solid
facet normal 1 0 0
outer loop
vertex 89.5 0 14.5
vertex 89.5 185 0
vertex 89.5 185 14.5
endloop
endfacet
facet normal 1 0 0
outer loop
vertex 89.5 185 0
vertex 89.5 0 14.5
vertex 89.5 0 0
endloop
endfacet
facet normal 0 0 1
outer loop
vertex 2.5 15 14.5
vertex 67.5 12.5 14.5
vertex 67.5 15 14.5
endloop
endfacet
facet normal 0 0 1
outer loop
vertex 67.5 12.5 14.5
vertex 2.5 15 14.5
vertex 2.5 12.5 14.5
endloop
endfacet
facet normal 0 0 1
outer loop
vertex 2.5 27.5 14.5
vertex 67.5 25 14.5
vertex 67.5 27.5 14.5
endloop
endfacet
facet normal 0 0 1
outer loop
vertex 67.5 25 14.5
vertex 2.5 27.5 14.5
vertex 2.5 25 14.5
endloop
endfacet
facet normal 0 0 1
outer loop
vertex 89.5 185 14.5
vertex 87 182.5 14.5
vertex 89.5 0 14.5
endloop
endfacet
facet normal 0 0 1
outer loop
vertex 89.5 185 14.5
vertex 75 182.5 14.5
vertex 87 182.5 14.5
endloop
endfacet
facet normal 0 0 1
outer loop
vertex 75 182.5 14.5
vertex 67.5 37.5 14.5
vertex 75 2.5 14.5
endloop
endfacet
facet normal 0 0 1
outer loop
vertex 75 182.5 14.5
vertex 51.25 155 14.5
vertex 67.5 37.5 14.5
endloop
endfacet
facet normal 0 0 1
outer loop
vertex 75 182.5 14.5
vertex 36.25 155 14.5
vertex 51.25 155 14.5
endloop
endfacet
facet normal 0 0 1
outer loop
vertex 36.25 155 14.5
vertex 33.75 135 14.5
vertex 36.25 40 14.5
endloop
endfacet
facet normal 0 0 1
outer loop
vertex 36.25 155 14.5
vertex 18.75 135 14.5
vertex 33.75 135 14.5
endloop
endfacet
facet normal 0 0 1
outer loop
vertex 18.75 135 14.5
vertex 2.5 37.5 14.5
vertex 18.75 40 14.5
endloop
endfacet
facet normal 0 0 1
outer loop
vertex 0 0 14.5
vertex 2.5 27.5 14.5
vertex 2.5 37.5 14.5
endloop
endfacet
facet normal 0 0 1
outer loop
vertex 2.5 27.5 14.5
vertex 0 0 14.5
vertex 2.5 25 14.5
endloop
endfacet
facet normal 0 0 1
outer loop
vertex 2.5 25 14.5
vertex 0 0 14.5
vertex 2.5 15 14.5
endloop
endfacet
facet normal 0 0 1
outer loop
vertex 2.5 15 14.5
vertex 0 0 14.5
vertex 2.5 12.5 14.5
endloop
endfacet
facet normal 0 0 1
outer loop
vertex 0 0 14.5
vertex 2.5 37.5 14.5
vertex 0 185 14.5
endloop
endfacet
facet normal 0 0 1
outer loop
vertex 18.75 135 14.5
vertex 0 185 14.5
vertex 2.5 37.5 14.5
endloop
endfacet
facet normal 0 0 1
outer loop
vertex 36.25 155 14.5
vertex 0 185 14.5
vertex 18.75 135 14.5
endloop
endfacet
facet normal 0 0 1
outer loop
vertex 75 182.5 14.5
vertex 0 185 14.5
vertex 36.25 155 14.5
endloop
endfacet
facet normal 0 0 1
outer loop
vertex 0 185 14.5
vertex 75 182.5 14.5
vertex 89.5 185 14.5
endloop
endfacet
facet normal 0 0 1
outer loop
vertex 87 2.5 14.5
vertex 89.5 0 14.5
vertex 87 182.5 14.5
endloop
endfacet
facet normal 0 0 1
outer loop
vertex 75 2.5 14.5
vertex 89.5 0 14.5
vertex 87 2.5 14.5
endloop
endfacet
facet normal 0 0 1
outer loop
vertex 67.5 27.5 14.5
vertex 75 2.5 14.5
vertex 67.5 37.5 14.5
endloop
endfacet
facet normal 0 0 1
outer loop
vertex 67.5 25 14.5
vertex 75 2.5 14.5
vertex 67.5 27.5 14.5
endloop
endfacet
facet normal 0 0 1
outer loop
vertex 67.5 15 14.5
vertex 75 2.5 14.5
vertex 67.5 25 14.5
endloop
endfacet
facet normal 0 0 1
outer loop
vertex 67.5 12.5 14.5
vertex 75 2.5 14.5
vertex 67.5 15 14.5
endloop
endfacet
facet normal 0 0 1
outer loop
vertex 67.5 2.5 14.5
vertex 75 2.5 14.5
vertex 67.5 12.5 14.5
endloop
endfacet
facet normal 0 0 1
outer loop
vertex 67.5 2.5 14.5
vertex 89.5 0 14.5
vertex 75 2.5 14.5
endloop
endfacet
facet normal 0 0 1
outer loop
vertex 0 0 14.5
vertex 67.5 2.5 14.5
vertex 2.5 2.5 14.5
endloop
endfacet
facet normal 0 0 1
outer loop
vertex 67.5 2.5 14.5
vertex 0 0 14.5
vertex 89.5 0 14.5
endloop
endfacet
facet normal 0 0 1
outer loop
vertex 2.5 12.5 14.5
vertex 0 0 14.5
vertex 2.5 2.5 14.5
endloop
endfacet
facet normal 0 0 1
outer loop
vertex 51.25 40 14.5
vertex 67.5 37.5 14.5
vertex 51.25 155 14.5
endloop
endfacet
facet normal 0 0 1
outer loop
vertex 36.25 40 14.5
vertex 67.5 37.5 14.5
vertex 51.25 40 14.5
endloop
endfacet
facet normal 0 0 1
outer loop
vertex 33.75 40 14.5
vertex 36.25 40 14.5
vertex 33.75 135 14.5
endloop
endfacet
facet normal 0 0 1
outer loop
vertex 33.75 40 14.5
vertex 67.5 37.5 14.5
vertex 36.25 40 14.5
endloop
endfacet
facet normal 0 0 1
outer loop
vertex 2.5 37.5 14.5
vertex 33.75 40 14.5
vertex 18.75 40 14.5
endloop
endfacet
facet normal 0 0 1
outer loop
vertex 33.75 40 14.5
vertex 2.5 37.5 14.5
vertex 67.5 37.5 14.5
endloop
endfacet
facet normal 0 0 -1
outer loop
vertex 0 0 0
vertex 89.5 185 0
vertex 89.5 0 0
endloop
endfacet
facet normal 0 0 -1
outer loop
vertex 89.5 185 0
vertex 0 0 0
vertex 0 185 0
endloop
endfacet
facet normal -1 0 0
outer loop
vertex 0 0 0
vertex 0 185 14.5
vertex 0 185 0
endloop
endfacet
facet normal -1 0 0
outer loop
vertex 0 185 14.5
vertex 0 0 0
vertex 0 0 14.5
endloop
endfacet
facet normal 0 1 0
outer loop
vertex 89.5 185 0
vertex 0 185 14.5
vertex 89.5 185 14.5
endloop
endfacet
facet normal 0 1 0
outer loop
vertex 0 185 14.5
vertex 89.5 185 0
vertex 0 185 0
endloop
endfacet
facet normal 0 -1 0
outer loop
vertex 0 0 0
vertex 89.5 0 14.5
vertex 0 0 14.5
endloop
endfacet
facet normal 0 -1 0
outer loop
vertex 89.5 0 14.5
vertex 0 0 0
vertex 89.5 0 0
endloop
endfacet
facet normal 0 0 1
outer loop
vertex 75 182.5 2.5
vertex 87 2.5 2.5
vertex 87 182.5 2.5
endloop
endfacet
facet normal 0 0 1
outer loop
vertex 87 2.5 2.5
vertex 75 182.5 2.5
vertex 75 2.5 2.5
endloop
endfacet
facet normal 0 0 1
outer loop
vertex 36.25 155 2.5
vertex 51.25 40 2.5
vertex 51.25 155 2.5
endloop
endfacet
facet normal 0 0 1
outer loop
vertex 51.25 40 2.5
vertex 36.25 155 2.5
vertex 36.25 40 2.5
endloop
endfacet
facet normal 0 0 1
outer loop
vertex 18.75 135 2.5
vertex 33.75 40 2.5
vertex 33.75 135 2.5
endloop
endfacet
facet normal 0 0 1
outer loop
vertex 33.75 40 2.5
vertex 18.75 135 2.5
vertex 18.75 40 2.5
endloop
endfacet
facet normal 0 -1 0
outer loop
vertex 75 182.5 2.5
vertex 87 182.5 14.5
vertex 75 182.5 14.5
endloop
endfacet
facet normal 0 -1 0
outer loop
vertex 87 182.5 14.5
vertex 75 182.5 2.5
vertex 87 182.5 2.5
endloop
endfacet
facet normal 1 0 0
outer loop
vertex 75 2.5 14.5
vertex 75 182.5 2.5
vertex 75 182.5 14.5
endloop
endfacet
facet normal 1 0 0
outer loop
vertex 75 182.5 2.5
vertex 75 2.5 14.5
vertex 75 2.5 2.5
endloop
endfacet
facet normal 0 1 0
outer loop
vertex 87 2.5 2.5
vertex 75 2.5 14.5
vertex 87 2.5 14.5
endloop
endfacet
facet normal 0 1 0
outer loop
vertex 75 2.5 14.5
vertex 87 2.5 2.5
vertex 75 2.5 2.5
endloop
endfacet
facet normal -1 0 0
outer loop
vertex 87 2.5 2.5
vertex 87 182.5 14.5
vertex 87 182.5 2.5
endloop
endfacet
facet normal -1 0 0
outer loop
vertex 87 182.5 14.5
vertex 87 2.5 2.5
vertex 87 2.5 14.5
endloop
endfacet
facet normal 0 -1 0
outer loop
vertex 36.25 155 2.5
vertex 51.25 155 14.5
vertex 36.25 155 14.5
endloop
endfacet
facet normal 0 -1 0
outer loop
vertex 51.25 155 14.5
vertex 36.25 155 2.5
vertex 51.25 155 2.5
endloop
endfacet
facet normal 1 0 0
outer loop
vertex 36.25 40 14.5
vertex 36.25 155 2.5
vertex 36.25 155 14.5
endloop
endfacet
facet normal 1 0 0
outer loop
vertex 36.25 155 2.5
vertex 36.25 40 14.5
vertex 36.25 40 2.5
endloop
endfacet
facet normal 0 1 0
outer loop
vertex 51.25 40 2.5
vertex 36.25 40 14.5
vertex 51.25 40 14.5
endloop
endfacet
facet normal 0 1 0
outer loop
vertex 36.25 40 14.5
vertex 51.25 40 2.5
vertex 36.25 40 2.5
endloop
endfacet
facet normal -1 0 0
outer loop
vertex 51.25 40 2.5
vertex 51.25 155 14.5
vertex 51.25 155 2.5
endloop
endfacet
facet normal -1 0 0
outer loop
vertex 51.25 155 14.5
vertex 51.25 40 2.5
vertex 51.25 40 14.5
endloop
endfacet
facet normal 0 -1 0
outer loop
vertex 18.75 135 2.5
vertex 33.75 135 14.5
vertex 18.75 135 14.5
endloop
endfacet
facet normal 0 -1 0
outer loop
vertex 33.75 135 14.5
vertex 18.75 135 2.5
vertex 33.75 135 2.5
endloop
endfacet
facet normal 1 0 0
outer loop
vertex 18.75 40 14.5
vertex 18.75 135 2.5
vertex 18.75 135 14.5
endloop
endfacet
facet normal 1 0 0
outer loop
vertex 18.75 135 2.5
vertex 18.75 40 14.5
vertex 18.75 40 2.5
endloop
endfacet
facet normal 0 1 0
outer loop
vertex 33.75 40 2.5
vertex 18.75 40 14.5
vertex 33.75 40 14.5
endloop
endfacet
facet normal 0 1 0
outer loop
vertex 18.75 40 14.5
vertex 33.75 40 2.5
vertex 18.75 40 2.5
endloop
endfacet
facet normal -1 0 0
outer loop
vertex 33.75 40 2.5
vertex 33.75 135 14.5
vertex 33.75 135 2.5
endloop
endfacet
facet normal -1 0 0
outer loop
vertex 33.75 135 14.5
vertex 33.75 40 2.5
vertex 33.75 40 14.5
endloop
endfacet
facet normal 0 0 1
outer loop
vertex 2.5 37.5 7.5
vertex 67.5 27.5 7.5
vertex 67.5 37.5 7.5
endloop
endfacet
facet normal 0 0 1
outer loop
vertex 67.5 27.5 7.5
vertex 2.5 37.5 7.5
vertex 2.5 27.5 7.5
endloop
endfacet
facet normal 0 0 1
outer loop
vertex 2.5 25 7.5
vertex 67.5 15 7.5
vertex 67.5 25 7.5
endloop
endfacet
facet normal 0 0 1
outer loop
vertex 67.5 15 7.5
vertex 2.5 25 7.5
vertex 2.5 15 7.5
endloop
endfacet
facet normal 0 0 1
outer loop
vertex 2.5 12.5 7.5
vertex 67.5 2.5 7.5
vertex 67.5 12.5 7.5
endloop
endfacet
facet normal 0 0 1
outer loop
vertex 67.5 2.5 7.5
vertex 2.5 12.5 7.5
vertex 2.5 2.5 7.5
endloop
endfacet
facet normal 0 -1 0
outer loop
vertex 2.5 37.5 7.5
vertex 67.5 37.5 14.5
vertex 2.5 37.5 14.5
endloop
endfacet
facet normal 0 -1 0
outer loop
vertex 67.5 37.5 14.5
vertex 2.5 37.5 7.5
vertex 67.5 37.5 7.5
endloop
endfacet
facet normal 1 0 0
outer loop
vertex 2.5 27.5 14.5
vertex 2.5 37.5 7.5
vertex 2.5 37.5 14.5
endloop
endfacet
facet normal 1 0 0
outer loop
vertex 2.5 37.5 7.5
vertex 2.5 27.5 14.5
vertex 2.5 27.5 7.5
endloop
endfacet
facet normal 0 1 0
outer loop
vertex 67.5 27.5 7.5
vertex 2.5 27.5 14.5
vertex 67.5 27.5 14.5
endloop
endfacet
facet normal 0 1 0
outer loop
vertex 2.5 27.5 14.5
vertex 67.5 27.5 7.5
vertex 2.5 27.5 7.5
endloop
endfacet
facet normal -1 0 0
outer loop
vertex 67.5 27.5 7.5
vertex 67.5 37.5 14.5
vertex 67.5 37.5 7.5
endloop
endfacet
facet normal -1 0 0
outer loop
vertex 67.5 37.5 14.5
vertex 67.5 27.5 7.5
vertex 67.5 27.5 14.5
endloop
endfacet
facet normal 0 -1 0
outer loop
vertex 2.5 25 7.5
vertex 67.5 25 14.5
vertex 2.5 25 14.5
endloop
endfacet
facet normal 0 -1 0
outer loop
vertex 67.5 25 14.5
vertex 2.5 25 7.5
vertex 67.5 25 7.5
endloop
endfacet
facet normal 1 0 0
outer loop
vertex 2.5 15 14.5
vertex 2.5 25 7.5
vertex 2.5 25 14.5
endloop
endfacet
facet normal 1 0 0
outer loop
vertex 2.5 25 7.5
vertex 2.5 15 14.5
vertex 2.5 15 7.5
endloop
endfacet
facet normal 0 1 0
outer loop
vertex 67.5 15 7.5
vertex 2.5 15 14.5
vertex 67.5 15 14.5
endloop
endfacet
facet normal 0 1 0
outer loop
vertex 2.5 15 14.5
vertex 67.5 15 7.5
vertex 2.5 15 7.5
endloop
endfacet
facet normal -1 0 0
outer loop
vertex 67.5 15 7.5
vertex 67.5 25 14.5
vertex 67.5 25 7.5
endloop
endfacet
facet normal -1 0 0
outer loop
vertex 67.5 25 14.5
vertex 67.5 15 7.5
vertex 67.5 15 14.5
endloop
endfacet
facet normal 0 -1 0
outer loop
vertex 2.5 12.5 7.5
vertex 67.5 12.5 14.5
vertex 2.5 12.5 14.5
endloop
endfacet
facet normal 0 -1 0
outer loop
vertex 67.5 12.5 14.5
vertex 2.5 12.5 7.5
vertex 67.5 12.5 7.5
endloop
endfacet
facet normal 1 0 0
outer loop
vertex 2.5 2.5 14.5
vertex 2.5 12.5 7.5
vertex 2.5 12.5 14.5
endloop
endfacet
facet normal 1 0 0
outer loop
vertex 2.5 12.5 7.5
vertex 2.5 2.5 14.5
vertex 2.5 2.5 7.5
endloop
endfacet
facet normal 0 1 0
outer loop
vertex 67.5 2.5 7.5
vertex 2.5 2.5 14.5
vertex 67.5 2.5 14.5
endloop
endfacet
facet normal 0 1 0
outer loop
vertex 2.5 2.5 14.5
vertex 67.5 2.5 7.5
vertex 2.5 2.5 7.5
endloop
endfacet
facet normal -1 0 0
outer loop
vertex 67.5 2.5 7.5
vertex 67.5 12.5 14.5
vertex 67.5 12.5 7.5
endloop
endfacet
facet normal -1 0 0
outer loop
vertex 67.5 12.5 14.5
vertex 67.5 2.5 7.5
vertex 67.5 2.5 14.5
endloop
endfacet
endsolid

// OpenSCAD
// created by IndiePandaaaaa|Lukas

TOLERANCE = 0.15;
FN = $preview ? 25 : 120;

MATERIAL_THICKNESS = 2.5;
BOX_THICKNESS = 12;

TAP_WRENCH_WIDTH = 12; // wrench is turned for better accessability
TAP_WRENCH_HEIGHT = 180;

TAP_CUTTER_METRICAL_WIDTH = 10;
TAP_CUTTER_METRICAL_HEIGHT = 65;
TAP_CUTTER_METRICAL_THICKNESS = 7;
TAP_CUTTER_METRICAL_ADDITIONAL_OFFSET = 5;

TAP_CUTTER_UNC14_WIDTH = 15;
TAP_CUTTER_UNC14_HEIGHT = 95;
TAP_CUTTER_UNC38_WIDTH = 15;
TAP_CUTTER_UNC38_HEIGHT = 115;

FULL_WIDTH = TAP_WRENCH_WIDTH + TAP_CUTTER_METRICAL_HEIGHT + MATERIAL_THICKNESS * 3 +
    TAP_CUTTER_METRICAL_ADDITIONAL_OFFSET;
FULL_HEIGHT = TAP_WRENCH_HEIGHT + MATERIAL_THICKNESS * 2;
FULL_THICKNESS = MATERIAL_THICKNESS + BOX_THICKNESS;

difference() {
    cube([FULL_WIDTH, FULL_HEIGHT, FULL_THICKNESS]);
    translate([0, 0, MATERIAL_THICKNESS]) linear_extrude(BOX_THICKNESS) {
        // imperial tap cutters
        unc_width = TAP_CUTTER_METRICAL_HEIGHT - (TAP_CUTTER_UNC14_WIDTH + TAP_CUTTER_UNC38_WIDTH + MATERIAL_THICKNESS);
        translate([unc_width / 2, (TAP_CUTTER_METRICAL_WIDTH + MATERIAL_THICKNESS) * 3, 0]) polygon([
                [MATERIAL_THICKNESS, MATERIAL_THICKNESS],
                [MATERIAL_THICKNESS + TAP_CUTTER_UNC14_WIDTH, MATERIAL_THICKNESS],
                [MATERIAL_THICKNESS + TAP_CUTTER_UNC14_WIDTH, MATERIAL_THICKNESS + TAP_CUTTER_UNC14_HEIGHT],
                [MATERIAL_THICKNESS, MATERIAL_THICKNESS + TAP_CUTTER_UNC14_HEIGHT],
            ]);
        translate([unc_width / 2 + TAP_CUTTER_UNC14_WIDTH + MATERIAL_THICKNESS,
                (TAP_CUTTER_METRICAL_WIDTH + MATERIAL_THICKNESS) * 3, 0]) polygon([
                [MATERIAL_THICKNESS, MATERIAL_THICKNESS],
                [MATERIAL_THICKNESS + TAP_CUTTER_UNC38_WIDTH, MATERIAL_THICKNESS],
                [MATERIAL_THICKNESS + TAP_CUTTER_UNC38_WIDTH, MATERIAL_THICKNESS + TAP_CUTTER_UNC38_HEIGHT],
                [MATERIAL_THICKNESS, MATERIAL_THICKNESS + TAP_CUTTER_UNC38_HEIGHT],
            ]);
        // tap wrench
        translate([TAP_CUTTER_METRICAL_HEIGHT + MATERIAL_THICKNESS + TAP_CUTTER_METRICAL_ADDITIONAL_OFFSET, 0, 0])
            polygon([
                    [MATERIAL_THICKNESS, MATERIAL_THICKNESS],
                    [MATERIAL_THICKNESS + TAP_WRENCH_WIDTH, MATERIAL_THICKNESS],
                    [MATERIAL_THICKNESS + TAP_WRENCH_WIDTH, MATERIAL_THICKNESS + TAP_WRENCH_HEIGHT],
                    [MATERIAL_THICKNESS, MATERIAL_THICKNESS + TAP_WRENCH_HEIGHT],
                ]);
    }
    translate([0, 0, MATERIAL_THICKNESS + (BOX_THICKNESS - TAP_CUTTER_METRICAL_THICKNESS)])
        linear_extrude(BOX_THICKNESS) {
            for (i = [0:2]) {// metrical tap cutters
                translate([0, (TAP_CUTTER_METRICAL_WIDTH + MATERIAL_THICKNESS) * i, 0]) polygon([
                        [MATERIAL_THICKNESS, MATERIAL_THICKNESS],
                        [MATERIAL_THICKNESS + TAP_CUTTER_METRICAL_HEIGHT, MATERIAL_THICKNESS],
                        [MATERIAL_THICKNESS + TAP_CUTTER_METRICAL_HEIGHT, MATERIAL_THICKNESS + TAP_CUTTER_METRICAL_WIDTH
                        ],
                        [MATERIAL_THICKNESS, MATERIAL_THICKNESS + TAP_CUTTER_METRICAL_WIDTH],
                    ]);
            }
        }

}
